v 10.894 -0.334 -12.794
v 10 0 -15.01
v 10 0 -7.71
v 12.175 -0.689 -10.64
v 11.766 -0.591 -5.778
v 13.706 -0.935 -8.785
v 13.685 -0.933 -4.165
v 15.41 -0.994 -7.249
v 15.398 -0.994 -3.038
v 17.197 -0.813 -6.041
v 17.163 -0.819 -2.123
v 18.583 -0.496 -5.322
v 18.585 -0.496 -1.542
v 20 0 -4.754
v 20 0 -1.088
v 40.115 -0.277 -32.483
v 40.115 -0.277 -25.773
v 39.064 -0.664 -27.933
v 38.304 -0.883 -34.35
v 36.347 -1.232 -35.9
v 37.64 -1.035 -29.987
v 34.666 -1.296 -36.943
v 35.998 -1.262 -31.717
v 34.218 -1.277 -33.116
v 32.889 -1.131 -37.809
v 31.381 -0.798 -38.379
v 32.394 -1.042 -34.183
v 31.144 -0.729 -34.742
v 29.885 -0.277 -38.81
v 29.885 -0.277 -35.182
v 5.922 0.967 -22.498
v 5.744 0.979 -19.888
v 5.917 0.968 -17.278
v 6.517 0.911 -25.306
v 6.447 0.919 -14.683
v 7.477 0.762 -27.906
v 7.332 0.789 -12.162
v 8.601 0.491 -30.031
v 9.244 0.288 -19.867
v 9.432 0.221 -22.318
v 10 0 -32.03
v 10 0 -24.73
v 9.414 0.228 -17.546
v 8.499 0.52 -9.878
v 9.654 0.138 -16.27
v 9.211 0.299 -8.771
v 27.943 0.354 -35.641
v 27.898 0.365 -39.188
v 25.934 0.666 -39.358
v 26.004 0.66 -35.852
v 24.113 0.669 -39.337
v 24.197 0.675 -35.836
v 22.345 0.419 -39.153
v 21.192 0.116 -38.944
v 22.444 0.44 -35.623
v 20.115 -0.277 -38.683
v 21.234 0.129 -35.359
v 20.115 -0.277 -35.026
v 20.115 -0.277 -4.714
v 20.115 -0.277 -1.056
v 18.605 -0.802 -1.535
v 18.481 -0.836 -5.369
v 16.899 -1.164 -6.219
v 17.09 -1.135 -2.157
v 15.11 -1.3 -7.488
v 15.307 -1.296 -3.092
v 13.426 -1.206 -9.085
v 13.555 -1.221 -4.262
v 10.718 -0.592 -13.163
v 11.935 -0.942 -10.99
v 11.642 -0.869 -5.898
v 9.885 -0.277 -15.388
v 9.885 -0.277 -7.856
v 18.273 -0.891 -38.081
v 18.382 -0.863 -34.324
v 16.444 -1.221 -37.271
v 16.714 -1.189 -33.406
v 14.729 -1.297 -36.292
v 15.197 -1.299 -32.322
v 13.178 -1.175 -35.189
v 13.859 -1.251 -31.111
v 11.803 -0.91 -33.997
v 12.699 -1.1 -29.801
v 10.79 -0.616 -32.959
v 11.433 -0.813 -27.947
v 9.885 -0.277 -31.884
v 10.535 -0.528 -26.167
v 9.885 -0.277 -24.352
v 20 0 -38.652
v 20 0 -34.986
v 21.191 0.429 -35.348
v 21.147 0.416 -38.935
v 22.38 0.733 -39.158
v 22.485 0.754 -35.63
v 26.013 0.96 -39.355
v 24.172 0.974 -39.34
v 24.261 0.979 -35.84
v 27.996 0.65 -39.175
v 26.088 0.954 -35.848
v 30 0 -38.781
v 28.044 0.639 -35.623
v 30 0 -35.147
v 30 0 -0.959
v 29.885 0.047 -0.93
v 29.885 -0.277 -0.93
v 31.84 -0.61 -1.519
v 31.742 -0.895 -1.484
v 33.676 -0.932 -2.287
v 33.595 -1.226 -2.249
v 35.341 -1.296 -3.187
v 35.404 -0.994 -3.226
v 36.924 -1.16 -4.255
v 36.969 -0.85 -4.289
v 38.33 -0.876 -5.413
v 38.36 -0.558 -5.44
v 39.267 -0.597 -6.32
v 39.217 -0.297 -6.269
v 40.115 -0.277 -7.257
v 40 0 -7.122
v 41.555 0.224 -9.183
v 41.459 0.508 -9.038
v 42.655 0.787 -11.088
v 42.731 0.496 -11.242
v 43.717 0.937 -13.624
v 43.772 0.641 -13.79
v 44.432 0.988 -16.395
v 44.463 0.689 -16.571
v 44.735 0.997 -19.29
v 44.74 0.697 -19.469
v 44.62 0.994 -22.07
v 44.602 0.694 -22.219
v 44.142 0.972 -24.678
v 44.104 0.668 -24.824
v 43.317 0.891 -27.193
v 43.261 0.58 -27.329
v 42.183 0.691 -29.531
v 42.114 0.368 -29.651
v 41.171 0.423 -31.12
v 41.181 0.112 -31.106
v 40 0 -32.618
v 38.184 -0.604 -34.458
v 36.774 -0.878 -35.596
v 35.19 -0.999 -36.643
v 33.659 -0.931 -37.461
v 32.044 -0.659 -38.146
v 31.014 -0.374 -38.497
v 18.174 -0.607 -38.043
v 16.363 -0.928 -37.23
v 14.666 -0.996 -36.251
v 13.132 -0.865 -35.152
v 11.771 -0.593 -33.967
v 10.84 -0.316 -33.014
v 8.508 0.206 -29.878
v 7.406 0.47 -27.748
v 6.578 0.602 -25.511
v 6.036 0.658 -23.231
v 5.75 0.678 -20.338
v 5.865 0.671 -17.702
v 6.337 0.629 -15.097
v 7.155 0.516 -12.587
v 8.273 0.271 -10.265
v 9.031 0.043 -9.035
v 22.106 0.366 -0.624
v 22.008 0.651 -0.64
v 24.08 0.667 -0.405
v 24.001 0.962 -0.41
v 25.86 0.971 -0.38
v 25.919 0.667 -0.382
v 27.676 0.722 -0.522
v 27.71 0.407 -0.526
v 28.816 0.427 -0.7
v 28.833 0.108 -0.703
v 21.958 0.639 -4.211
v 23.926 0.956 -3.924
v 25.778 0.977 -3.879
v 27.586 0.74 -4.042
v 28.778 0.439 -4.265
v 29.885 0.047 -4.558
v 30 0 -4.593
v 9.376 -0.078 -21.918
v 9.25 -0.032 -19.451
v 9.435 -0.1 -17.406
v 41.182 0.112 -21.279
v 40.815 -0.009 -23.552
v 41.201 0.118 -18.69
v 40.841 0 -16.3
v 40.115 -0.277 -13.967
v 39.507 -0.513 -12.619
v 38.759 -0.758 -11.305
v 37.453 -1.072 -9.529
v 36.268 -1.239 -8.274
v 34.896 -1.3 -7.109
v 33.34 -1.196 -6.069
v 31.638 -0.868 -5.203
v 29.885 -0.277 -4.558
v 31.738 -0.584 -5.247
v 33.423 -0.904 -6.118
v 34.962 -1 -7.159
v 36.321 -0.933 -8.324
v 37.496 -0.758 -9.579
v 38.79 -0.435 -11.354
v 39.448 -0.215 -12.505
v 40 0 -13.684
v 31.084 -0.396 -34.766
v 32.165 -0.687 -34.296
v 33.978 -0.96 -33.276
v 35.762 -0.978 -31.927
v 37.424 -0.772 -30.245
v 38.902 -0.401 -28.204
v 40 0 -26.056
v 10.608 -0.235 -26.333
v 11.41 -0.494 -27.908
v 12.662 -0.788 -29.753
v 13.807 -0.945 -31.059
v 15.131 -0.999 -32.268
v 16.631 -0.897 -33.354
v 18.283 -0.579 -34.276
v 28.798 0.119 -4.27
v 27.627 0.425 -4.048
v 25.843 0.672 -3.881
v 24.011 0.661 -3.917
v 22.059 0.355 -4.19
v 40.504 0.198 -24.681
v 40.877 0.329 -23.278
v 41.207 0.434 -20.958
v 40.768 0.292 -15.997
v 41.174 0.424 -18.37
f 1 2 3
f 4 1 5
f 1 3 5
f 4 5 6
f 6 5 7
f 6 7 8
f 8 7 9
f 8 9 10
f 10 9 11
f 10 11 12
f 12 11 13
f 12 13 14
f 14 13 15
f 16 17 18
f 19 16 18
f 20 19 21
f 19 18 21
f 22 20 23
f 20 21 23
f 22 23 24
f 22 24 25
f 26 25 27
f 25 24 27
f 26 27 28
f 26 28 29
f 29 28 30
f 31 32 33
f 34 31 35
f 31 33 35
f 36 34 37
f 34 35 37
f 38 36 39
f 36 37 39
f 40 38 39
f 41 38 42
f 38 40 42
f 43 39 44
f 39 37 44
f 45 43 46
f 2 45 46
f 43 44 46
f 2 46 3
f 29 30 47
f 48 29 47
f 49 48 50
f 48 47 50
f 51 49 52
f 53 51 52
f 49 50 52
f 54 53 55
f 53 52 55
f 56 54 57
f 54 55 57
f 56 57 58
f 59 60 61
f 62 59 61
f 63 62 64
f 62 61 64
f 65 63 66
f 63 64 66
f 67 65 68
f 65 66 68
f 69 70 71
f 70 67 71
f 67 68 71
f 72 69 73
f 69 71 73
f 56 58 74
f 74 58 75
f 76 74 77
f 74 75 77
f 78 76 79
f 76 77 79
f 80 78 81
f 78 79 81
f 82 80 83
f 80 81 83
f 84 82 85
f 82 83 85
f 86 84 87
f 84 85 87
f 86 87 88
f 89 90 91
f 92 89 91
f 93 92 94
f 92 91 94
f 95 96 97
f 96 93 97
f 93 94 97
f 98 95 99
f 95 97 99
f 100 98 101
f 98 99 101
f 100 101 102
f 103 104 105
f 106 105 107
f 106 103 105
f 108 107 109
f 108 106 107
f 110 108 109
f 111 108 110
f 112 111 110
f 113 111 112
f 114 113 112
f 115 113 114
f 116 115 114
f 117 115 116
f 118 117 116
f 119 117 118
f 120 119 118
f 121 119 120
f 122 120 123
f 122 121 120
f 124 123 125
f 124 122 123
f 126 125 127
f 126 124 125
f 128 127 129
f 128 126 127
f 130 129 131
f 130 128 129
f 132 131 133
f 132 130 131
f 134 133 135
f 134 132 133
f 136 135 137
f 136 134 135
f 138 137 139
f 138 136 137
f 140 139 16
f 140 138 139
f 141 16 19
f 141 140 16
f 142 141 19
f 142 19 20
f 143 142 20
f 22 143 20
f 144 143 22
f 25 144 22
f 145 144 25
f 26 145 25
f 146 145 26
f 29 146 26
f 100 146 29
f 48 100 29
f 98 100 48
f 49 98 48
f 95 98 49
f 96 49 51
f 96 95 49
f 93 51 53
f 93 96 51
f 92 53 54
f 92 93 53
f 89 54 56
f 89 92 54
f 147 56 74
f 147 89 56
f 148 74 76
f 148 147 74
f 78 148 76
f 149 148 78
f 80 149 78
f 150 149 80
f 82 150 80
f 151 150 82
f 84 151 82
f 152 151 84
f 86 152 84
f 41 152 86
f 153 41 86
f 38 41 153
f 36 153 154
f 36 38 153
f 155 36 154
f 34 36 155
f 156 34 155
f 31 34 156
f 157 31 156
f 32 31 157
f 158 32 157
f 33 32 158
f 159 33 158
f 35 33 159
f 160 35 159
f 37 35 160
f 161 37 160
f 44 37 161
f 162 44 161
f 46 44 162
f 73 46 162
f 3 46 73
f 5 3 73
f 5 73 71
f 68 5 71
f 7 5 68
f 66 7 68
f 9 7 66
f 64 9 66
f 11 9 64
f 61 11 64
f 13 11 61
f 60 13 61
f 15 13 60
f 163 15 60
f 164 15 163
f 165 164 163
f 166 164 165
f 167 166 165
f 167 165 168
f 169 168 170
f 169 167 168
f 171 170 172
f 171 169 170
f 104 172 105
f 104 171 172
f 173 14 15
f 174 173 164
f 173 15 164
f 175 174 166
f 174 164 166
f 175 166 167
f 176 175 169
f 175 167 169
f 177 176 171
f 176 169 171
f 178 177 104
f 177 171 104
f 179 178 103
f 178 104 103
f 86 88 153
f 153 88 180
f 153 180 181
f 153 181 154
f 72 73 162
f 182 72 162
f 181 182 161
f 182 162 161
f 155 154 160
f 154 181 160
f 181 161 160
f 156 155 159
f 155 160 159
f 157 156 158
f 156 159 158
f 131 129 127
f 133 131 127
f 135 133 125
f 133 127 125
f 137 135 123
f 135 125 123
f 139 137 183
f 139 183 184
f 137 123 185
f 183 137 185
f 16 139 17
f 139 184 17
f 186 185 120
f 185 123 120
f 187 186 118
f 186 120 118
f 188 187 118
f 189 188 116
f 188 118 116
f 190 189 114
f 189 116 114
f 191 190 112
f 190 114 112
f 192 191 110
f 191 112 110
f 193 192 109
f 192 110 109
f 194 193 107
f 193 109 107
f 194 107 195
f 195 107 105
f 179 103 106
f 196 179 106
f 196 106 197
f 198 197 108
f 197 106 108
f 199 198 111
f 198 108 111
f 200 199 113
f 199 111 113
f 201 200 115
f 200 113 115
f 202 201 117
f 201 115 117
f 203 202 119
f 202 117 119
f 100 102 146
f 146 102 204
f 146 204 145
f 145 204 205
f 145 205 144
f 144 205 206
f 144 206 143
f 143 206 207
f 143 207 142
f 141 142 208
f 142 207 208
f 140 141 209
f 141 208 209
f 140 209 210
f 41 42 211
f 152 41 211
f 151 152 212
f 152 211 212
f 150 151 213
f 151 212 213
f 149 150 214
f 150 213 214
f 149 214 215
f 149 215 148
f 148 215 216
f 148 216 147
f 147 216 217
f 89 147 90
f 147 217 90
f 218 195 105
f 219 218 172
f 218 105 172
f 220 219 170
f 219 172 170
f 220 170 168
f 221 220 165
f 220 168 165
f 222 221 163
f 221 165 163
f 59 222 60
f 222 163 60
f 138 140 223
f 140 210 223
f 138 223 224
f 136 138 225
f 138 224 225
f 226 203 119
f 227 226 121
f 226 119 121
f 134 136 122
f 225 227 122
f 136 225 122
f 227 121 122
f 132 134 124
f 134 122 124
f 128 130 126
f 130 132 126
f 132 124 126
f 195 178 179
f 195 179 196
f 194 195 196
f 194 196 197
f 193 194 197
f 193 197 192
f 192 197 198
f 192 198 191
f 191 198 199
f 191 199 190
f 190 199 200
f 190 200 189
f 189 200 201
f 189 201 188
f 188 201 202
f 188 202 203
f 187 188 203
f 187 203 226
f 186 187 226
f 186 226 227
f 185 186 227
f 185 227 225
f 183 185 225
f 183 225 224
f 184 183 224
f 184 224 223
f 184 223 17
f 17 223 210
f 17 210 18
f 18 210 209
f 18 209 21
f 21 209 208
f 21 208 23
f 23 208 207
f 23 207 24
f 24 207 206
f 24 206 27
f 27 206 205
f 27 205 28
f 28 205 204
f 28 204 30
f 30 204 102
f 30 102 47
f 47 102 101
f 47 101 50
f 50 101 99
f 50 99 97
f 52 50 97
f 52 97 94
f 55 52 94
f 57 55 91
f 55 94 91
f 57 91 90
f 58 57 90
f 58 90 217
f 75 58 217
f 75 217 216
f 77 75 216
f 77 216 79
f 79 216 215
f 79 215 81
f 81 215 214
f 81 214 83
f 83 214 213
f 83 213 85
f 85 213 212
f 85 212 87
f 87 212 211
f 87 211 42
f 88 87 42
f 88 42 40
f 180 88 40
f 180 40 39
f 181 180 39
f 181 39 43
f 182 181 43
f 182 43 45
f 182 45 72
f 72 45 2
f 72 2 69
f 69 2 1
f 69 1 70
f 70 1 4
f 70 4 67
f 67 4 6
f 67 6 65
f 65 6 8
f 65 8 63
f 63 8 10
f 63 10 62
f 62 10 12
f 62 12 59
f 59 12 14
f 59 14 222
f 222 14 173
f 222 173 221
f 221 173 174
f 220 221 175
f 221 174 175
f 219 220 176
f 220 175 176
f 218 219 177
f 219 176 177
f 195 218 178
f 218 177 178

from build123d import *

# Parameters (mm, degrees)
EXTRU_MINCE1_DEPTH      = 40
ESQUISSE2_OUTSIDE_W     = 64.814
ESQUISSE2_OUTSIDE_H     = 54.814
ESQUISSE2_OUTSIDE_R     = 19.5
ESQUISSE2_OUTSIDE_R_2   = 16
ENL_V_MAT_EXTRU_1_DEPTH = 40


with BuildPart() as part:
    # Esquisse1 → Extru.-Mince1 (new body)
    with BuildSketch(Plane.XY):
        with BuildLine():
            ThreePointArc((0, 0), (5, 1), (10, 0))
            ThreePointArc((10, 0), (15, -1), (20, 0))
            ThreePointArc((20, 0), (25, 1), (30, 0))
            ThreePointArc((30, 0), (35, -1), (40, 0))
            ThreePointArc((40, 0), (45, 1), (50, 0))
            Line((50, 0), (49.884615385, -0.276923077))
            ThreePointArc((49.884615385, -0.276923077), (45, 0.7), (40.115384615, -0.276923077))
            ThreePointArc((40.115384615, -0.276923077), (35, -1.3), (29.884615385, -0.276923077))
            ThreePointArc((29.884615385, -0.276923077), (25, 0.7), (20.115384615, -0.276923077))
            ThreePointArc((20.115384615, -0.276923077), (15, -1.3), (9.884615385, -0.276923077))
            ThreePointArc((9.884615385, -0.276923077), (5, 0.7), (0.115384615, -0.276923077))
            Line((0.115384615, -0.276923077), (0, 0))
        make_face()
    extrude(amount=-EXTRU_MINCE1_DEPTH)

    # Esquisse2 outside → Enlèv. mat.-Extru.1 (cut)
    # profile 1 of 2: a face of its own
    with BuildSketch(Plane(origin=(0, 5, 0), x_dir=(-1, 0, 0), z_dir=(0, 1, 0))):
        with Locations((-25, -20)):
            Rectangle(ESQUISSE2_OUTSIDE_W, ESQUISSE2_OUTSIDE_H)
        with Locations(Location((-25.24411071, -19.869880187, 0), (0, 0, 103.767029359))):
            Circle(ESQUISSE2_OUTSIDE_R, mode=Mode.SUBTRACT)
    # profile 2 of 2: a face of its own
    with BuildSketch(Plane(origin=(0, 5, 0), x_dir=(-1, 0, 0), z_dir=(0, 1, 0))):
        with Locations(Location((-25.24411071, -19.869880187, 0), (0, 0, 106.859844414))):
            Circle(ESQUISSE2_OUTSIDE_R_2)
    extrude(amount=-ENL_V_MAT_EXTRU_1_DEPTH, mode=Mode.SUBTRACT)


solid = part.part
